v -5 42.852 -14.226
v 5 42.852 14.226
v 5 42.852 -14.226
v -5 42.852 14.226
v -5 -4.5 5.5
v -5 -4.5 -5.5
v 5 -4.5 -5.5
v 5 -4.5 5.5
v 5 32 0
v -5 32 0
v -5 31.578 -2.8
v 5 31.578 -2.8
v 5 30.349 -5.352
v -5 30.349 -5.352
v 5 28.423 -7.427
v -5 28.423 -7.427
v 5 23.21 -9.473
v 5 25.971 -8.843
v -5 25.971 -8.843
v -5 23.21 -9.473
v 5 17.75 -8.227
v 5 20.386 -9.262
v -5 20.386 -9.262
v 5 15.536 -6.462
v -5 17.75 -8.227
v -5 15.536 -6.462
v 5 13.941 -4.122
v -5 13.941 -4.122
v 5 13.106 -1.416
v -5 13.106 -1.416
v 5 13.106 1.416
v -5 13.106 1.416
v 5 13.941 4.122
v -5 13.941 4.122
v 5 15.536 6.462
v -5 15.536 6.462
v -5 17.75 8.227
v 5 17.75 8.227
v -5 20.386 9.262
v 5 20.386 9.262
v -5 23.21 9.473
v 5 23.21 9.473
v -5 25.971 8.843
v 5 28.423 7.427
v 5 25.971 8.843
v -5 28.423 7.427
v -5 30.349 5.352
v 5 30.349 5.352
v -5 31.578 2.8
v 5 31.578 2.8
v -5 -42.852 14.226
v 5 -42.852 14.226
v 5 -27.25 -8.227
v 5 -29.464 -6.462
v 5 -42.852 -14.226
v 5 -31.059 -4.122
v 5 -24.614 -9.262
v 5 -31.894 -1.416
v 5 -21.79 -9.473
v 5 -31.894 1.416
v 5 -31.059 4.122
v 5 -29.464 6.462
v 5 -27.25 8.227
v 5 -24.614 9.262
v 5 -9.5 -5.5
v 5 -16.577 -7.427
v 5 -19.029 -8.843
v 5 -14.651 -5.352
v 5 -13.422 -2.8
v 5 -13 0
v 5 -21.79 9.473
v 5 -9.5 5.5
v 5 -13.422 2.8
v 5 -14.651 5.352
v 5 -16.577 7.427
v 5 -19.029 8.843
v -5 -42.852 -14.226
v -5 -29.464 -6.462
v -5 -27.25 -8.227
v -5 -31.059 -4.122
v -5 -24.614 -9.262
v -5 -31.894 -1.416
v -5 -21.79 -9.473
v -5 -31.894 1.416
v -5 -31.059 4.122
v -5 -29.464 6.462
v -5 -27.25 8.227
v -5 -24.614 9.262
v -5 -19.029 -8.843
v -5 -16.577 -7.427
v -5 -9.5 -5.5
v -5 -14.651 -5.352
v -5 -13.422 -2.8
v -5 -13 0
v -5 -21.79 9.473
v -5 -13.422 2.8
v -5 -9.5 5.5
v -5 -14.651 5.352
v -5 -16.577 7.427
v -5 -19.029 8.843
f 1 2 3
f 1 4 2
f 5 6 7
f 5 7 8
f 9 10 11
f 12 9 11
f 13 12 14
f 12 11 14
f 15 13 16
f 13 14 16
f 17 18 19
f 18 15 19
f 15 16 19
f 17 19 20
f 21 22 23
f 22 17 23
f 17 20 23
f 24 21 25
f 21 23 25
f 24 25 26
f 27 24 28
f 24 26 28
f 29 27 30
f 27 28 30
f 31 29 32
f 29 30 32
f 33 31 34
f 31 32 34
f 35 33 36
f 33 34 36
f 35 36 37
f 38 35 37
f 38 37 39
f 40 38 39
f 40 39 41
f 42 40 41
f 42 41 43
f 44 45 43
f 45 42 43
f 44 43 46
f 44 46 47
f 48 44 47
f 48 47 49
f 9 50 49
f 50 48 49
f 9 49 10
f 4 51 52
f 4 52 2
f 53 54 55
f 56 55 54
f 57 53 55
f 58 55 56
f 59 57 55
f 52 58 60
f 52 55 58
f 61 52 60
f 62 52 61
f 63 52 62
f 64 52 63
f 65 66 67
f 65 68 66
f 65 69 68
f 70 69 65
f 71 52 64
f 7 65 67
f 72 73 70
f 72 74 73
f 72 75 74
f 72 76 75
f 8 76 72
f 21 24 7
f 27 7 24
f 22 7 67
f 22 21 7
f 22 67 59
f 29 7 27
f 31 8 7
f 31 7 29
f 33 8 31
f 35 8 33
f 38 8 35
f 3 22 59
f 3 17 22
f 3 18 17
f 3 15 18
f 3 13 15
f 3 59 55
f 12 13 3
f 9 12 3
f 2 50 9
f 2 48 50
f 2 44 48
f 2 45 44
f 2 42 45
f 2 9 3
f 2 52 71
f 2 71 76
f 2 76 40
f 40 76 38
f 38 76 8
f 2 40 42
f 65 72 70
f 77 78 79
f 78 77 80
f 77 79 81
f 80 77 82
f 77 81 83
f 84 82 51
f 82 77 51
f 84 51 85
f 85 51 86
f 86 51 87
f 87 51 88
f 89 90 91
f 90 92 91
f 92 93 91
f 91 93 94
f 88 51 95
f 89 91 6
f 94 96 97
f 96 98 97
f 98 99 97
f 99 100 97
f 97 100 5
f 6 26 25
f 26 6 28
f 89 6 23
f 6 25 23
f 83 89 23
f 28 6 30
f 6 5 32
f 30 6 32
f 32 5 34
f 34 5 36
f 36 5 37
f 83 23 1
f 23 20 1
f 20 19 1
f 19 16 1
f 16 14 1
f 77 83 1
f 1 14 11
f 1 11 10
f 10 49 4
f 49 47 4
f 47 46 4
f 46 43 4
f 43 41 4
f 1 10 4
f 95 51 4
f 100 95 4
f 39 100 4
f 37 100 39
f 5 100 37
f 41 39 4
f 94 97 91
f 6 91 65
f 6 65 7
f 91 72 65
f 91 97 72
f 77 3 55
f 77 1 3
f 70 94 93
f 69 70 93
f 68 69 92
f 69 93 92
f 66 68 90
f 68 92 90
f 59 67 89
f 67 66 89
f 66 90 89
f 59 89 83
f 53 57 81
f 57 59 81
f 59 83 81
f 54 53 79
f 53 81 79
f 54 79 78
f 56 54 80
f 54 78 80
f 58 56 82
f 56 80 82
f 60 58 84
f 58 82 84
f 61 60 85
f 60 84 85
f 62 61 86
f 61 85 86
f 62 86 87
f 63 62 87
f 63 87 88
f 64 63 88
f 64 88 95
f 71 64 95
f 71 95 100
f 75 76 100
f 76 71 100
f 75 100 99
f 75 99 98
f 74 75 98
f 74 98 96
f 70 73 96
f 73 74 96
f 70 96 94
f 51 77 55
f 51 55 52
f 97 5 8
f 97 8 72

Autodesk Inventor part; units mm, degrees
ref_plane "UpperRodPlane" through (0, 22.5, 0) normal (0, 1, 0) x (-1, 0, 0)
ref_plane "LowerRodPlane" through (0, -22.5, 0) normal (0, 1, 0) x (-1, 0, 0)
ref_plane "RearClearancePlane" through (0, 0, -11) normal (0, 0, 1) x (1, 0, 0)
sketch "Sketch1" plane through (0, 0, 0) normal (1, 0, 0) x (0, 1, 0)
  circle A0 centre (22.5, 0) radius 9.5
  circle A1 centre (-22.5, 0) radius 9.5
  line L0 (-4.5, 5.5) -> (-9.5, 5.5)
  line L1 (-9.5, 5.5) -> (-9.5, -5.5)
  line L2 (-9.5, -5.5) -> (-4.5, -5.5)
  line L3 (-4.5, -5.5) -> (-4.5, 5.5)
  line L4 (-4.5, 5.5) -> (-9.5, -5.5) construction
  line L5 (-9.5, 5.5) -> (-4.5, -5.5) construction
  line L6 (42.8516, -14.2259) -> (-42.8516, -14.2259)
  line L7 (-42.8516, -14.2259) -> (-42.8516, 14.2259)
  line L8 (-42.8516, 14.2259) -> (42.8516, 14.2259)
  line L9 (42.8516, 14.2259) -> (42.8516, -14.2259)
  line L10 (42.8516, -14.2259) -> (-42.8516, 14.2259) construction
  line L11 (-42.8516, -14.2259) -> (42.8516, 14.2259) construction
  point P0 (0, 0)
  point P1 (-7, 0)
  dimension "d3" = 19
  dimension "d4" = 19
  dimension "d5" = 11
  dimension "d6" = 13
  dimension "d7" = 27
extrude "Extrusion1" add sketch "Sketch1" along normal mid plane 10
properties part number "E-Axis v2.0"
